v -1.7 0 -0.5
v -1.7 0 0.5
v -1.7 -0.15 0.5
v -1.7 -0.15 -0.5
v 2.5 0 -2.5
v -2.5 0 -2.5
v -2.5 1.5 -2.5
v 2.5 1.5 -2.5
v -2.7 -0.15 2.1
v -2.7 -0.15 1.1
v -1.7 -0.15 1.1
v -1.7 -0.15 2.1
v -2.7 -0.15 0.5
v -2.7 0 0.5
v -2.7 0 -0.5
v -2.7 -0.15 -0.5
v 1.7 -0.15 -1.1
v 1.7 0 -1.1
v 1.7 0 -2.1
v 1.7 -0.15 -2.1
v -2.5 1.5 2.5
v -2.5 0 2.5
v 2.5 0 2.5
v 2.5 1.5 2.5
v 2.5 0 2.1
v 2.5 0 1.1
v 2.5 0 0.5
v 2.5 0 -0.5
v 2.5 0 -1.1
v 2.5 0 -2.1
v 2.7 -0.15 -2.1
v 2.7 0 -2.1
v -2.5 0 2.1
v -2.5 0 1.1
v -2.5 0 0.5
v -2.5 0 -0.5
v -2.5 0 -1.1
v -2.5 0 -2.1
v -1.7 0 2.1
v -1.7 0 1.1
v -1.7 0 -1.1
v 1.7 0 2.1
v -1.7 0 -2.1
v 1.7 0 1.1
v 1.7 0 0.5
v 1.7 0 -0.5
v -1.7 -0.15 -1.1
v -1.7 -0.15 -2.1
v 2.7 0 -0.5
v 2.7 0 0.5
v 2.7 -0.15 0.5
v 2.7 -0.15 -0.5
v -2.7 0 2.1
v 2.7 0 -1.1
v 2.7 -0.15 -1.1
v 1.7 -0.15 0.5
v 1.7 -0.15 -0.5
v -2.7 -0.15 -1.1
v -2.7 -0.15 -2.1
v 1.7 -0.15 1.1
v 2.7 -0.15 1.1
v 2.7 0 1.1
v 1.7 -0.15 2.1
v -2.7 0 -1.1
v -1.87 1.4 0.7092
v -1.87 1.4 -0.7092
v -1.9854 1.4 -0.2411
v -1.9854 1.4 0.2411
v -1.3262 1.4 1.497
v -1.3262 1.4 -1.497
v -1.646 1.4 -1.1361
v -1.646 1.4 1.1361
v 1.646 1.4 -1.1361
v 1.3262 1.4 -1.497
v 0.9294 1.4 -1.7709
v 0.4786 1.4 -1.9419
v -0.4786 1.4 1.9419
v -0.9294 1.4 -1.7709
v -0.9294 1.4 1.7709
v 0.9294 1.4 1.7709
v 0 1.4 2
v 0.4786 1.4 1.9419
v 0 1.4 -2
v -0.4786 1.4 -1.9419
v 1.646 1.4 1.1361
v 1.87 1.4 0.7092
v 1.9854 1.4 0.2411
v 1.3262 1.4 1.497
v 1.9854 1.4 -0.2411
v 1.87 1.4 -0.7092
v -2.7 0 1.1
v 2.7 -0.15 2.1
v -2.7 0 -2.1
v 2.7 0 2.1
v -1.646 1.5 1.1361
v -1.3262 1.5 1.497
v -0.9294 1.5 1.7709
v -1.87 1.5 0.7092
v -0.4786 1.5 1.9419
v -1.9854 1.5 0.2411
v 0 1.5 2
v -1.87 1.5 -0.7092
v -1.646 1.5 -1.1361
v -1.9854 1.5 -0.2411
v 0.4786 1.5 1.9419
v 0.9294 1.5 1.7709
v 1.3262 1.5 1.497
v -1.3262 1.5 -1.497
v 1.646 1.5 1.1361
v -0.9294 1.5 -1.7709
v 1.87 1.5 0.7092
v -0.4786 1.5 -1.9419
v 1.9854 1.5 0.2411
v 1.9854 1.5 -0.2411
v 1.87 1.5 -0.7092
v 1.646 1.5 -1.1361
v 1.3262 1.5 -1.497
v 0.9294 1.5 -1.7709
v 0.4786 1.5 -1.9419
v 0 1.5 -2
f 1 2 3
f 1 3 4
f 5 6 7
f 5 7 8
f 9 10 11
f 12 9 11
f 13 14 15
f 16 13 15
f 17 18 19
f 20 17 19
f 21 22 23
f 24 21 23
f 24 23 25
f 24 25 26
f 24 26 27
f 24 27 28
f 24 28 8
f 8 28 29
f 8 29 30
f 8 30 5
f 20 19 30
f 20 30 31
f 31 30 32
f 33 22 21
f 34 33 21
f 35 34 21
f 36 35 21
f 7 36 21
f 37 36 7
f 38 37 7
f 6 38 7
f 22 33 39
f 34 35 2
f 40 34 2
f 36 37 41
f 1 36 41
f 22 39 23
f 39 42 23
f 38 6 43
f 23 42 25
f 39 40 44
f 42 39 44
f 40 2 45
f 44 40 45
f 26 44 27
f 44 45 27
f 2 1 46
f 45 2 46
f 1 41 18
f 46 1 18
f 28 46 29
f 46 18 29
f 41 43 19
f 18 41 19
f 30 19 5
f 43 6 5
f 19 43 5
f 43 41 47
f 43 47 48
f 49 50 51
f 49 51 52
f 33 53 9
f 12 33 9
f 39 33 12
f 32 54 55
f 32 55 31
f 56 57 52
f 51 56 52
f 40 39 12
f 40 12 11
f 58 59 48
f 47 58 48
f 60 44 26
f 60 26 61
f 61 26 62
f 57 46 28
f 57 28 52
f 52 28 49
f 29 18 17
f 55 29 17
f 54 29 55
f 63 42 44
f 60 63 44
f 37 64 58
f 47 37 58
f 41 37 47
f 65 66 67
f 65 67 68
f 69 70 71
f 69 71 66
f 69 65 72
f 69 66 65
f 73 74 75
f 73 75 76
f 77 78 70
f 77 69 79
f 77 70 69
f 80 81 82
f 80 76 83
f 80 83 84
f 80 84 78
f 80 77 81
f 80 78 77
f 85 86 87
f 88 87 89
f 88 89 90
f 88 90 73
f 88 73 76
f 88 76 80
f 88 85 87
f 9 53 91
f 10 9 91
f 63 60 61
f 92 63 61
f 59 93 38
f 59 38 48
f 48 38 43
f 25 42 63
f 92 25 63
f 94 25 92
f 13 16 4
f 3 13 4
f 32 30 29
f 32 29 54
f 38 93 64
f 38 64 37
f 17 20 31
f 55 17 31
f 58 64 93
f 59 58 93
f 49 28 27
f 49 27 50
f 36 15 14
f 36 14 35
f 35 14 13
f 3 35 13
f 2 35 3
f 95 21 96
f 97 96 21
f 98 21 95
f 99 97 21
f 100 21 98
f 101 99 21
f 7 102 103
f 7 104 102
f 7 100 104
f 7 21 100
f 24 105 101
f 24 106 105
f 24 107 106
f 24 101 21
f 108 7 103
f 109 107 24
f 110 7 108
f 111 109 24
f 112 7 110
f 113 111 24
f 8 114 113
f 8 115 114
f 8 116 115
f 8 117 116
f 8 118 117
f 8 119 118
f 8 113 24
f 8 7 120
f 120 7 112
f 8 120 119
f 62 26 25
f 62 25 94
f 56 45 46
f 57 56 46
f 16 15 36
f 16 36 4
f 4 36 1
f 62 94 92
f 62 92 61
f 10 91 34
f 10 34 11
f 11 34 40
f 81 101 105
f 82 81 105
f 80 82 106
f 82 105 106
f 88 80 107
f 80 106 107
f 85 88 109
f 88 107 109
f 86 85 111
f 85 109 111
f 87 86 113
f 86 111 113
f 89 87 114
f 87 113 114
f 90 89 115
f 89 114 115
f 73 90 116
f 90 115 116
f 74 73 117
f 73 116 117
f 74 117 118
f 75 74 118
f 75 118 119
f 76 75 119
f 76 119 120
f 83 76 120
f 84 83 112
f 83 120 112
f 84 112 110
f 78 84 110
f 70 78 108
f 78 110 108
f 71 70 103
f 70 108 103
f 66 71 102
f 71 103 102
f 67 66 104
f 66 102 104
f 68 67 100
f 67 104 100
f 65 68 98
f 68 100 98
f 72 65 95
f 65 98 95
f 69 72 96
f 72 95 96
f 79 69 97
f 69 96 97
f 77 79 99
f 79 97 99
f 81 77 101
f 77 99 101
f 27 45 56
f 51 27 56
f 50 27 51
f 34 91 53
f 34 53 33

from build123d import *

# Parameters (mm, degrees)
SKETCH1_W           = 5
SKETCH1_H           = 5
BOSS_EXTRUDE1_DEPTH = 1.5
SKETCH1_3_W         = 1
SKETCH1_3_H         = 1
BOSS_EXTRUDE2_DEPTH = 0.15
SKETCH2_R           = 2
CUT_EXTRUDE1_DEPTH  = 0.1


with BuildPart() as part:
    # Sketch1 → Boss-Extrude1 (new body)
    with BuildSketch(Plane(origin=(0, 0, 0), x_dir=(1, 0, 0), z_dir=(0, 1, 0))):
        Rectangle(SKETCH1_W, SKETCH1_H)
    extrude(amount=BOSS_EXTRUDE1_DEPTH)

    # Sketch1<3> → Boss-Extrude2 (add)
    with BuildSketch(Plane(origin=(0, 0, 0), x_dir=(1, 0, 0), z_dir=(0, 1, 0))):
        with Locations((2.2, -1.6)):
            Rectangle(SKETCH1_3_W, SKETCH1_3_H)
        with Locations((-2.2, -1.6)):
            Rectangle(SKETCH1_3_W, SKETCH1_3_H)
        with Locations((2.2, 0)):
            Rectangle(SKETCH1_3_W, SKETCH1_3_H)
        with Locations((2.2, 1.6)):
            Rectangle(SKETCH1_3_W, SKETCH1_3_H)
        with Locations((-2.2, 0)):
            Rectangle(SKETCH1_3_W, SKETCH1_3_H)
        with Locations((-2.2, 1.6)):
            Rectangle(SKETCH1_3_W, SKETCH1_3_H)
    extrude(amount=-BOSS_EXTRUDE2_DEPTH)

    # Sketch2 → Cut-Extrude1 (cut)
    with BuildSketch(Plane(origin=(0, 1.5, 0), x_dir=(1, 0, 0), z_dir=(0, 1, 0))):
        Circle(SKETCH2_R)
    extrude(amount=-CUT_EXTRUDE1_DEPTH, mode=Mode.SUBTRACT)


solid = part.part
